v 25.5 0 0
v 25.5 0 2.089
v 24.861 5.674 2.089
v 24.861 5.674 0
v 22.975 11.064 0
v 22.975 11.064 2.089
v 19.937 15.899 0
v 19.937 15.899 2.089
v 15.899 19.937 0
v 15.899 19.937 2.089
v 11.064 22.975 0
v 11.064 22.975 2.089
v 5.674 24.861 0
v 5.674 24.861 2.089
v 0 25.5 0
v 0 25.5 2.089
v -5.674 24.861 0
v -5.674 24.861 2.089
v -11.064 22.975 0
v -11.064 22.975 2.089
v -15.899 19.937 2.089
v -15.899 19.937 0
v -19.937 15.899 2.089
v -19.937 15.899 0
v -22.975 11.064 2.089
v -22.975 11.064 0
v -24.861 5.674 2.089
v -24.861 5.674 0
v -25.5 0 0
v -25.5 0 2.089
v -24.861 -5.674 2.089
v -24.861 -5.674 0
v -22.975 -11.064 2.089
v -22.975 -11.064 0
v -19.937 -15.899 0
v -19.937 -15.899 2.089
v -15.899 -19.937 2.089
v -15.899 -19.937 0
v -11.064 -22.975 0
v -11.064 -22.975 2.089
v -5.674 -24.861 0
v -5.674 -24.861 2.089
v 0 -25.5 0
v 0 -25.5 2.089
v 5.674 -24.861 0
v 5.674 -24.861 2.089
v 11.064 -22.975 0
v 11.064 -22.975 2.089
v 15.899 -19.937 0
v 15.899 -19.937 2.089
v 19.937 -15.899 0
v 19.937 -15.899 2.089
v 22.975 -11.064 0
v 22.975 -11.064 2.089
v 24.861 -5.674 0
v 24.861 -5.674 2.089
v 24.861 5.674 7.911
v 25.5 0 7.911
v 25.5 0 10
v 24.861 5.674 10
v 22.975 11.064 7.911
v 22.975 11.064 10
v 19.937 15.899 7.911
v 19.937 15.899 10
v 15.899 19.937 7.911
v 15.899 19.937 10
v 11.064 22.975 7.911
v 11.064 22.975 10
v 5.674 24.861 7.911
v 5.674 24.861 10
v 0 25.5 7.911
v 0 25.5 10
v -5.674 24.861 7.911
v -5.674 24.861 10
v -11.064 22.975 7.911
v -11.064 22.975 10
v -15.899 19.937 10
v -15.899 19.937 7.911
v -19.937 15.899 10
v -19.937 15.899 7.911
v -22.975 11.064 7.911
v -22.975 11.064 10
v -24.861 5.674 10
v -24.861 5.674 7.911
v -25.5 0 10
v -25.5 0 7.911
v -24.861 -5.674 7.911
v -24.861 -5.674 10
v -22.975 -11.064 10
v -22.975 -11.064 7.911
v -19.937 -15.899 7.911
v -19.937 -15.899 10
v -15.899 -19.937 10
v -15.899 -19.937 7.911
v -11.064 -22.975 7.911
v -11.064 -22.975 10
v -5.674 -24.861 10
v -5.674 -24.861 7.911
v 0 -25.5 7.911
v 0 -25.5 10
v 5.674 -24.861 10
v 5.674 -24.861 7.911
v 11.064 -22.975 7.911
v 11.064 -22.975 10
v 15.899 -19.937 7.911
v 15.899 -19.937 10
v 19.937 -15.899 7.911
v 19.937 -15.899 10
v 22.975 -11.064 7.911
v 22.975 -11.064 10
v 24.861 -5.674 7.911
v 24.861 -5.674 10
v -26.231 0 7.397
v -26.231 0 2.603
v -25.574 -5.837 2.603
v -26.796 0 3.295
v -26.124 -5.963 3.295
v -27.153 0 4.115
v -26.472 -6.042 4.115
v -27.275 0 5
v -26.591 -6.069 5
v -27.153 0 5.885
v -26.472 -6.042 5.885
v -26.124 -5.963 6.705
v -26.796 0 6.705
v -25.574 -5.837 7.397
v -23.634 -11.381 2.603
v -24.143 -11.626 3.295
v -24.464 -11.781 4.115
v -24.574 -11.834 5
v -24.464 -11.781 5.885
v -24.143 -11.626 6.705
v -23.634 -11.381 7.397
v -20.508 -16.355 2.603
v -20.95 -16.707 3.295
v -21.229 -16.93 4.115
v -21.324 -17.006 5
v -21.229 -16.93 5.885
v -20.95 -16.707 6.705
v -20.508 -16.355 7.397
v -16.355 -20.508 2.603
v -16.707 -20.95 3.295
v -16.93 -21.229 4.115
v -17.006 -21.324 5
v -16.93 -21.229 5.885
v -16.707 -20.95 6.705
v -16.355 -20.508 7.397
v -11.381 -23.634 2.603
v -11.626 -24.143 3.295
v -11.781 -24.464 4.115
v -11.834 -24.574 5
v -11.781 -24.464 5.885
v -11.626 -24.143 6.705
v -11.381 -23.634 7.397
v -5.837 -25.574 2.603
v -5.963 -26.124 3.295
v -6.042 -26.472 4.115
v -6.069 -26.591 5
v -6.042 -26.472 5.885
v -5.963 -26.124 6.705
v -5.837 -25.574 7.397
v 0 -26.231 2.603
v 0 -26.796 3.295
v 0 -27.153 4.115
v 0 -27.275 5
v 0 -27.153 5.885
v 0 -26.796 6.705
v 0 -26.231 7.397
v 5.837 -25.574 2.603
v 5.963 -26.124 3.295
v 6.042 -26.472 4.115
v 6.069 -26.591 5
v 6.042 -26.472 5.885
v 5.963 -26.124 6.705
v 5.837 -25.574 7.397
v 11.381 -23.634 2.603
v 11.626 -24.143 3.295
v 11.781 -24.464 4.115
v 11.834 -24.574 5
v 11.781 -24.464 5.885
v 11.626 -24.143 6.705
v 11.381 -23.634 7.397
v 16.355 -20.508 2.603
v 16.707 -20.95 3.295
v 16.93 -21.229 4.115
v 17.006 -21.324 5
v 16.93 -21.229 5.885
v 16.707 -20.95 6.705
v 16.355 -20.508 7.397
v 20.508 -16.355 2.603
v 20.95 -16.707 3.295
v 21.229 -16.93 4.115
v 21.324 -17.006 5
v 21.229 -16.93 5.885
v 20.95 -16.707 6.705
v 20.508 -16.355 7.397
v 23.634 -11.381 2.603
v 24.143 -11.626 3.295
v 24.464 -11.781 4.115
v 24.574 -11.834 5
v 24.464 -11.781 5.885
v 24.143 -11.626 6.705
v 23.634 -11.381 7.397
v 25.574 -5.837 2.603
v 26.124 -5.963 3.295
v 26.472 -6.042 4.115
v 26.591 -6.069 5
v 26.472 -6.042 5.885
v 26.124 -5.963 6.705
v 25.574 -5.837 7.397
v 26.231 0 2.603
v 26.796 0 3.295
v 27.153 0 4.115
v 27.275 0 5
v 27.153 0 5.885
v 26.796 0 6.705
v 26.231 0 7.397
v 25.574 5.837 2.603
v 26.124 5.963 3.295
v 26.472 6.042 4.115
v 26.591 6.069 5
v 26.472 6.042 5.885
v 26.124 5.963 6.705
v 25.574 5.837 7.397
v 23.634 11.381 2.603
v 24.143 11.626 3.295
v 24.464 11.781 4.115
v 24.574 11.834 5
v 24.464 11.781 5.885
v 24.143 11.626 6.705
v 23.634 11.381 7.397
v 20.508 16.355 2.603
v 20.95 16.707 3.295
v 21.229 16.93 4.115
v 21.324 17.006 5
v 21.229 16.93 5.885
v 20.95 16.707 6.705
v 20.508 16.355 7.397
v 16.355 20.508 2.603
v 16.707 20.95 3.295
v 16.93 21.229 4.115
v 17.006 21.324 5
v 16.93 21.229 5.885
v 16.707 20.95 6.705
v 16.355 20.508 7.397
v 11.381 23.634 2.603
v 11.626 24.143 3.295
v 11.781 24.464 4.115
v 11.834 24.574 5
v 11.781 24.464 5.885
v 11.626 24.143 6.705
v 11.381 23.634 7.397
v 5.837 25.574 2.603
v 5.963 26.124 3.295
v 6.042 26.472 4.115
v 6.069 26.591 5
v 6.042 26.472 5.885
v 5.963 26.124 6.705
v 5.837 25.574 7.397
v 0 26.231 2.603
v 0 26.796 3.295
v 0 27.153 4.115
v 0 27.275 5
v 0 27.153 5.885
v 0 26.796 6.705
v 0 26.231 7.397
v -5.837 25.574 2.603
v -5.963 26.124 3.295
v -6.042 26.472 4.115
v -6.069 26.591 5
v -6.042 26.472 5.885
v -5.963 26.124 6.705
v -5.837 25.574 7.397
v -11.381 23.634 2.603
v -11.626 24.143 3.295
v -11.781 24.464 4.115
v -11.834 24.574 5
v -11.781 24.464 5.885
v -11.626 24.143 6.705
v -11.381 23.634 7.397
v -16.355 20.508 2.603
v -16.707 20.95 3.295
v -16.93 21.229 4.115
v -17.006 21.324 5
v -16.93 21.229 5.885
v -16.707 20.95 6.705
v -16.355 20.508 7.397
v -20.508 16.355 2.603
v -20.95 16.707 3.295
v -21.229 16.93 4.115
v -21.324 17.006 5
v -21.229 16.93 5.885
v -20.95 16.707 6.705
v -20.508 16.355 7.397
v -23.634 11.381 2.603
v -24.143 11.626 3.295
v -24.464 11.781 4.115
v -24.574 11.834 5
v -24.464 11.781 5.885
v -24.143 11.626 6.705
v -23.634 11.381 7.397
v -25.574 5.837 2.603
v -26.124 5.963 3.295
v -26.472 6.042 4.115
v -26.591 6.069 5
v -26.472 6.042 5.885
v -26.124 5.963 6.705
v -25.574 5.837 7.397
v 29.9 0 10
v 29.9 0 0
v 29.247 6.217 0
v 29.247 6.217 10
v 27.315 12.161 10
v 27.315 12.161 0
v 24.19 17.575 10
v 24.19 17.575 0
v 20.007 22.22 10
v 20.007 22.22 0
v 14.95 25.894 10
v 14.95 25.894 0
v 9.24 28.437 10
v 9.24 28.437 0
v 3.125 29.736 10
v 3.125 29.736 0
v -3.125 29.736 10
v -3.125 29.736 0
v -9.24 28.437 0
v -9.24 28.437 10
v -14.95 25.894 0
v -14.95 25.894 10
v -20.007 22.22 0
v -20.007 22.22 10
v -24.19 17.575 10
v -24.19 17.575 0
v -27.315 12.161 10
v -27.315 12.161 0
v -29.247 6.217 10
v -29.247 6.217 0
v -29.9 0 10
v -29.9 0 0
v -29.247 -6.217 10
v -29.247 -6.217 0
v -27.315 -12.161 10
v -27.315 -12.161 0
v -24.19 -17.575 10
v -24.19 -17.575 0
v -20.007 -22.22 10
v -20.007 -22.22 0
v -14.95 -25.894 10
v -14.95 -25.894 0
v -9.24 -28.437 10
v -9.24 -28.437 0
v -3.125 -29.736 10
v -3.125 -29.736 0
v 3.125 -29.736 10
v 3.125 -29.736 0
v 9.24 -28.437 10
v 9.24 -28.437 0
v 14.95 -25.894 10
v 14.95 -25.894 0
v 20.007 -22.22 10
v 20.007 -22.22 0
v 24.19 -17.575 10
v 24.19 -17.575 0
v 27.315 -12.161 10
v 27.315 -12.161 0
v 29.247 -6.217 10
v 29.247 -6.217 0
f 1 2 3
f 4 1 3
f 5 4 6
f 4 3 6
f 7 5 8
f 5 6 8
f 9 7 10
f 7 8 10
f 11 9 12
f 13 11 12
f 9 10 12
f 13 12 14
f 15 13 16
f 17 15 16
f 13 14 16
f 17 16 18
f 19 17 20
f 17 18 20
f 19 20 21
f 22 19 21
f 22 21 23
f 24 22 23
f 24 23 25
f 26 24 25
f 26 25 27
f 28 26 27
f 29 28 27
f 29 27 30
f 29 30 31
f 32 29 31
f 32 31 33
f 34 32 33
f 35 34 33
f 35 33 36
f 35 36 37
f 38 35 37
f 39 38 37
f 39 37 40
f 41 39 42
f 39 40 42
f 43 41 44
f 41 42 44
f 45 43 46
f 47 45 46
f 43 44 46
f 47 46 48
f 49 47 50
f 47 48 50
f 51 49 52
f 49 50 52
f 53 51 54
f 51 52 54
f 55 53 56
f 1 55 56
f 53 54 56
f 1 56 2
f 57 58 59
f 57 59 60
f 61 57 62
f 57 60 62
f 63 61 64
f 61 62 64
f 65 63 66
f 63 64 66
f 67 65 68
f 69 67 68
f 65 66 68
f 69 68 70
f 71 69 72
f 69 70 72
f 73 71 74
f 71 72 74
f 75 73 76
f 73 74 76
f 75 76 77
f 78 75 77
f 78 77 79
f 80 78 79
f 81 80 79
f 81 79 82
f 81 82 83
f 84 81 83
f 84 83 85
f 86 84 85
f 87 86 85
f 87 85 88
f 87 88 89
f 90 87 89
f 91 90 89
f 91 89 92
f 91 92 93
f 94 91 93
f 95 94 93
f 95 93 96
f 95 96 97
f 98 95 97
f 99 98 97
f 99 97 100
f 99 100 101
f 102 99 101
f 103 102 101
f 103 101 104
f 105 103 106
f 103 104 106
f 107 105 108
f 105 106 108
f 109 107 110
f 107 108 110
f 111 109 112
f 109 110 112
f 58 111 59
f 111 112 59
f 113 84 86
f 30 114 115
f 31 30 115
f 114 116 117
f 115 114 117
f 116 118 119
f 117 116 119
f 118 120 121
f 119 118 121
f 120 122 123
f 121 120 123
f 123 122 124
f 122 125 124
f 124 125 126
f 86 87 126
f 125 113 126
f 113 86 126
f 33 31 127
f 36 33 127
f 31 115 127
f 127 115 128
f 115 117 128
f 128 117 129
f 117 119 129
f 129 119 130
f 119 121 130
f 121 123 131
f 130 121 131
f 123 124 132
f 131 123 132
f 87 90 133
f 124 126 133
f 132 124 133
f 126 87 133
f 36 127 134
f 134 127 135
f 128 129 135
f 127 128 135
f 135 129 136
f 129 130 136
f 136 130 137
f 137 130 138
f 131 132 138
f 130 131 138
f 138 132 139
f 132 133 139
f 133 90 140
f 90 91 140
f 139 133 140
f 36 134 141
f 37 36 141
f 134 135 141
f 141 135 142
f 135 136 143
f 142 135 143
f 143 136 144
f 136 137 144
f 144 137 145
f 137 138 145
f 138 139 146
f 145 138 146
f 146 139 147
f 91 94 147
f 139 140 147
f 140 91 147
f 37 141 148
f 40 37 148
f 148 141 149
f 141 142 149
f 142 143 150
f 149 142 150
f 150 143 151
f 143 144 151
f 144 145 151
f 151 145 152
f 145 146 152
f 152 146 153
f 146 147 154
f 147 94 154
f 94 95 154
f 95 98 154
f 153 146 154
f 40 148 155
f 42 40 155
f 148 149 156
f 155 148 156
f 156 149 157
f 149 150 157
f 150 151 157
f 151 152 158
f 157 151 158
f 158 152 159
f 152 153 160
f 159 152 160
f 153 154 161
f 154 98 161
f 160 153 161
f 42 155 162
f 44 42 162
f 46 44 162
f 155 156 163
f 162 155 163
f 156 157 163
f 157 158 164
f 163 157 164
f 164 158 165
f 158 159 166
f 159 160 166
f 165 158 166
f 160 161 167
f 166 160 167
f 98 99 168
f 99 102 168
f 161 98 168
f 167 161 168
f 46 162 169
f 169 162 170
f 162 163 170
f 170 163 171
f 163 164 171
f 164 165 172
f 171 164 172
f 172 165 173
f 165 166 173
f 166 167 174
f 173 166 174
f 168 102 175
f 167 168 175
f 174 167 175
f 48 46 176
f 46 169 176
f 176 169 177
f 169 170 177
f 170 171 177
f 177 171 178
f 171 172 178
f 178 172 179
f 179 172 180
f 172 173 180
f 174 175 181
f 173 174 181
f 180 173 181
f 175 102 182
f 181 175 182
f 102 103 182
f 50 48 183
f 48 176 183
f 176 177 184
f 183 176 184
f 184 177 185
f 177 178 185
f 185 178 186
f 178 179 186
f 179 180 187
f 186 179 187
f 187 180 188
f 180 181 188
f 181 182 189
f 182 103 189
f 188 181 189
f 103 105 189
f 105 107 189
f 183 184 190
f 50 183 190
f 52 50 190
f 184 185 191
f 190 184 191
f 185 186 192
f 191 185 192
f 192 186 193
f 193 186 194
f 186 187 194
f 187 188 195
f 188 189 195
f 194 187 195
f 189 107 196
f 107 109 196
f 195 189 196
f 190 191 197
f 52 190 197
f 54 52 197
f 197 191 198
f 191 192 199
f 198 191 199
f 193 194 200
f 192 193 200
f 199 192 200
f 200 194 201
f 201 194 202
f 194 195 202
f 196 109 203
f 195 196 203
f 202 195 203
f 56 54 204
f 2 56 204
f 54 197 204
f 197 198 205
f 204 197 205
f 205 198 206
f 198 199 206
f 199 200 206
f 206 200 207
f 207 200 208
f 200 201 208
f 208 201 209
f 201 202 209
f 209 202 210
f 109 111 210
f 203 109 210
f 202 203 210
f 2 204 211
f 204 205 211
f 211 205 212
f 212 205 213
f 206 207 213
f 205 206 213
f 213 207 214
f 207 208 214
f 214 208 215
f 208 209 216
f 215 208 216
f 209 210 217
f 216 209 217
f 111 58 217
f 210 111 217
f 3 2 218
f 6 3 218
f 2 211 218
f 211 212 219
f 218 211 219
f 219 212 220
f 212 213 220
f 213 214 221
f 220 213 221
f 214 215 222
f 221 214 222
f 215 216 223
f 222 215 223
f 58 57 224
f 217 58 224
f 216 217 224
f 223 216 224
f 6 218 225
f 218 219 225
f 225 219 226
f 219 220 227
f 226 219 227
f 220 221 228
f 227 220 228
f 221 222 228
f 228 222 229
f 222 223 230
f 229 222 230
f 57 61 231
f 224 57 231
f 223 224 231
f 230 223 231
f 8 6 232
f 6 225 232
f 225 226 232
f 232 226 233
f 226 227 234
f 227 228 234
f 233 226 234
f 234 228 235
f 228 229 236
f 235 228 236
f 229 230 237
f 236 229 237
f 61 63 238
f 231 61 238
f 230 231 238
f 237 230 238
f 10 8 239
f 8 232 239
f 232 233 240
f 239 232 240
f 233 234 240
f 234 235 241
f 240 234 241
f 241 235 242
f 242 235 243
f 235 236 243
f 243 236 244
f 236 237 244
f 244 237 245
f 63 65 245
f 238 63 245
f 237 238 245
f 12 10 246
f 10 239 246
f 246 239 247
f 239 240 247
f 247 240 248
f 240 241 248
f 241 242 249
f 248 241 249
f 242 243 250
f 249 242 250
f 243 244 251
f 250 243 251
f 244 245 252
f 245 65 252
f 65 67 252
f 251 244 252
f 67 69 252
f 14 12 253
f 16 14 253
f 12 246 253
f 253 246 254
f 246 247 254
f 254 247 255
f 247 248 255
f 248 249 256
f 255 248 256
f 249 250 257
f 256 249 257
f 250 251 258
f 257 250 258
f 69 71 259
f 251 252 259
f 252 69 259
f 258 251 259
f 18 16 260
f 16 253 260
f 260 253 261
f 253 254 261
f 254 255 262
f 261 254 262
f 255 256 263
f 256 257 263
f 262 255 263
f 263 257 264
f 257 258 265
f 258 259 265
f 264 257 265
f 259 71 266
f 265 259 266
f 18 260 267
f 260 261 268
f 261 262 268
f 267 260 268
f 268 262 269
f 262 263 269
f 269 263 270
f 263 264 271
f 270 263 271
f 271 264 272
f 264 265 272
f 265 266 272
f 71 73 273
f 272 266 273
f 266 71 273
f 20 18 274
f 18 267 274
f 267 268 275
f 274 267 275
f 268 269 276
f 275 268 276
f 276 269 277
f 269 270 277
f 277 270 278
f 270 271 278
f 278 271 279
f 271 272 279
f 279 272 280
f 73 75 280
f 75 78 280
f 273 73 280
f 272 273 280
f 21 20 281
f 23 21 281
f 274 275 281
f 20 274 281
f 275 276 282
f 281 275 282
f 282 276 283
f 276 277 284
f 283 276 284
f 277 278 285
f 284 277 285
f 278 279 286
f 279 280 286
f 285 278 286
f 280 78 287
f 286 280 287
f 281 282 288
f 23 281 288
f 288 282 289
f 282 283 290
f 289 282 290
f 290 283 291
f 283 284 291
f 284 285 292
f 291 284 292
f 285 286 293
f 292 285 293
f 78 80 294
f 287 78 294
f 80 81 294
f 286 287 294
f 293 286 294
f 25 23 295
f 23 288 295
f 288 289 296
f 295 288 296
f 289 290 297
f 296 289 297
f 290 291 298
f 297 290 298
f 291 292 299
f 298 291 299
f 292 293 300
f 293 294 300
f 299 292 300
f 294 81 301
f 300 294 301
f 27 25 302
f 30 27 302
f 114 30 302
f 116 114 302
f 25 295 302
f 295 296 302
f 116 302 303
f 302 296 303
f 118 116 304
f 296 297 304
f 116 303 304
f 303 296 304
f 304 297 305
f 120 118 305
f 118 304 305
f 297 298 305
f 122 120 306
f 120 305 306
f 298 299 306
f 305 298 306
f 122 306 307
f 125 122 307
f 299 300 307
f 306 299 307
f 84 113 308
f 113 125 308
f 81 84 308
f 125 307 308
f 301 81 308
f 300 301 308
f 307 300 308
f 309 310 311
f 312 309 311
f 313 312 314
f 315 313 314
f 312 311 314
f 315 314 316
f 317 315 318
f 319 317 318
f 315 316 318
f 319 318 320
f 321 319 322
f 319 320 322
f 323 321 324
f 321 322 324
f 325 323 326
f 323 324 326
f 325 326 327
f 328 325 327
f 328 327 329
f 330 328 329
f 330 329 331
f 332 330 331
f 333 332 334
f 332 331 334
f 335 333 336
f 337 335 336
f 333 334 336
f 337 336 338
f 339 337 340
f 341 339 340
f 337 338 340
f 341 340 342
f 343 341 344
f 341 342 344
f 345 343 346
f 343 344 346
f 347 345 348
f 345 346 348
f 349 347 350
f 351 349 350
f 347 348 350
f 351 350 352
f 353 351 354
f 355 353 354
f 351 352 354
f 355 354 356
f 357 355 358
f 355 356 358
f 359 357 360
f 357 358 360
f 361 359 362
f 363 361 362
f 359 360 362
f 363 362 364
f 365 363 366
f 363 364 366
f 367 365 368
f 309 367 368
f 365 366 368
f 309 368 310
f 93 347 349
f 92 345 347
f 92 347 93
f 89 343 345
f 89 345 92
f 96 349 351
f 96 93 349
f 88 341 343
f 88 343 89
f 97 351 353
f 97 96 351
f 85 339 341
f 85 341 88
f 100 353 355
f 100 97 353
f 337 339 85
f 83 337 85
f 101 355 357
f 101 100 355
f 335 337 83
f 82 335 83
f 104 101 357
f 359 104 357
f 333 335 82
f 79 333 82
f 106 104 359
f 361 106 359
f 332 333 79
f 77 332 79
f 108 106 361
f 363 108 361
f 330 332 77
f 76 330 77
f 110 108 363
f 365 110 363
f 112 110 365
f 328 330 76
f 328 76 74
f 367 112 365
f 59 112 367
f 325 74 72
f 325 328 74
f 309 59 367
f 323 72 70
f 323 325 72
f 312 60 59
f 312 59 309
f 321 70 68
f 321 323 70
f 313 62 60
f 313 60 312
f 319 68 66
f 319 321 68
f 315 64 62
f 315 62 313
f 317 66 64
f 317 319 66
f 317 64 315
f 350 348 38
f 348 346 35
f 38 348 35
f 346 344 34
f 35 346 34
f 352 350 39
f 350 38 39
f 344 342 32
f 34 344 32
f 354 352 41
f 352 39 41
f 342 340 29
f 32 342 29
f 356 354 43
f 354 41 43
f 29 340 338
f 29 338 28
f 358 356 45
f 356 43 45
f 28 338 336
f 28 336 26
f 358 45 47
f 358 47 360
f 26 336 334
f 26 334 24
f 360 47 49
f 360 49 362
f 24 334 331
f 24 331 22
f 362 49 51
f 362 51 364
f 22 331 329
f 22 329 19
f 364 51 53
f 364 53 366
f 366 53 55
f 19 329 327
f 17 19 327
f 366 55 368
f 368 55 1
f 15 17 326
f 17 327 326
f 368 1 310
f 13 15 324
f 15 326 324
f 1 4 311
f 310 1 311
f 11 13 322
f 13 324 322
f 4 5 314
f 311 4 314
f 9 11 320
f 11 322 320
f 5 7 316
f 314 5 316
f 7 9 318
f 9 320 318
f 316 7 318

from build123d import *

# Parameters (mm, degrees)
SKETCH1_R           = 29.9
BOSS_EXTRUDE1_DEPTH = 10
CUT_EXTRUDE1_REACH  = 12
SKETCH2_R           = 25.5
SKETCH3_R           = 3.275


with BuildPart() as part:
    # Sketch1 → Boss-Extrude1 (new body)
    with BuildSketch(Plane.XY):
        Circle(SKETCH1_R)
    extrude(amount=BOSS_EXTRUDE1_DEPTH)

    # Sketch2 → Cut-Extrude1 (cut, up to next)
    with BuildSketch(Plane.XY.offset(10), mode=Mode.PRIVATE) as cut_extrude1_sk1:
        Circle(SKETCH2_R)
    cut_extrude1_tool1 = extrude(cut_extrude1_sk1.sketch, amount=-CUT_EXTRUDE1_REACH, mode=Mode.PRIVATE) & part.part
    add(cut_extrude1_tool1.solids().sort_by_distance((0, 0, 10))[0], mode=Mode.SUBTRACT)

    # Sketch3 → Cut-Revolve2 (revolve, cut)
    with BuildSketch(Plane(origin=(0, 0, 0), x_dir=(1, 0, 0), z_dir=(0, 1, 0))):
        with Locations((-24, -5)):
            Circle(SKETCH3_R)
    revolve(axis=Axis((0, 0, -18.462767292), (0, 0, 1)), mode=Mode.SUBTRACT)


solid = part.part
